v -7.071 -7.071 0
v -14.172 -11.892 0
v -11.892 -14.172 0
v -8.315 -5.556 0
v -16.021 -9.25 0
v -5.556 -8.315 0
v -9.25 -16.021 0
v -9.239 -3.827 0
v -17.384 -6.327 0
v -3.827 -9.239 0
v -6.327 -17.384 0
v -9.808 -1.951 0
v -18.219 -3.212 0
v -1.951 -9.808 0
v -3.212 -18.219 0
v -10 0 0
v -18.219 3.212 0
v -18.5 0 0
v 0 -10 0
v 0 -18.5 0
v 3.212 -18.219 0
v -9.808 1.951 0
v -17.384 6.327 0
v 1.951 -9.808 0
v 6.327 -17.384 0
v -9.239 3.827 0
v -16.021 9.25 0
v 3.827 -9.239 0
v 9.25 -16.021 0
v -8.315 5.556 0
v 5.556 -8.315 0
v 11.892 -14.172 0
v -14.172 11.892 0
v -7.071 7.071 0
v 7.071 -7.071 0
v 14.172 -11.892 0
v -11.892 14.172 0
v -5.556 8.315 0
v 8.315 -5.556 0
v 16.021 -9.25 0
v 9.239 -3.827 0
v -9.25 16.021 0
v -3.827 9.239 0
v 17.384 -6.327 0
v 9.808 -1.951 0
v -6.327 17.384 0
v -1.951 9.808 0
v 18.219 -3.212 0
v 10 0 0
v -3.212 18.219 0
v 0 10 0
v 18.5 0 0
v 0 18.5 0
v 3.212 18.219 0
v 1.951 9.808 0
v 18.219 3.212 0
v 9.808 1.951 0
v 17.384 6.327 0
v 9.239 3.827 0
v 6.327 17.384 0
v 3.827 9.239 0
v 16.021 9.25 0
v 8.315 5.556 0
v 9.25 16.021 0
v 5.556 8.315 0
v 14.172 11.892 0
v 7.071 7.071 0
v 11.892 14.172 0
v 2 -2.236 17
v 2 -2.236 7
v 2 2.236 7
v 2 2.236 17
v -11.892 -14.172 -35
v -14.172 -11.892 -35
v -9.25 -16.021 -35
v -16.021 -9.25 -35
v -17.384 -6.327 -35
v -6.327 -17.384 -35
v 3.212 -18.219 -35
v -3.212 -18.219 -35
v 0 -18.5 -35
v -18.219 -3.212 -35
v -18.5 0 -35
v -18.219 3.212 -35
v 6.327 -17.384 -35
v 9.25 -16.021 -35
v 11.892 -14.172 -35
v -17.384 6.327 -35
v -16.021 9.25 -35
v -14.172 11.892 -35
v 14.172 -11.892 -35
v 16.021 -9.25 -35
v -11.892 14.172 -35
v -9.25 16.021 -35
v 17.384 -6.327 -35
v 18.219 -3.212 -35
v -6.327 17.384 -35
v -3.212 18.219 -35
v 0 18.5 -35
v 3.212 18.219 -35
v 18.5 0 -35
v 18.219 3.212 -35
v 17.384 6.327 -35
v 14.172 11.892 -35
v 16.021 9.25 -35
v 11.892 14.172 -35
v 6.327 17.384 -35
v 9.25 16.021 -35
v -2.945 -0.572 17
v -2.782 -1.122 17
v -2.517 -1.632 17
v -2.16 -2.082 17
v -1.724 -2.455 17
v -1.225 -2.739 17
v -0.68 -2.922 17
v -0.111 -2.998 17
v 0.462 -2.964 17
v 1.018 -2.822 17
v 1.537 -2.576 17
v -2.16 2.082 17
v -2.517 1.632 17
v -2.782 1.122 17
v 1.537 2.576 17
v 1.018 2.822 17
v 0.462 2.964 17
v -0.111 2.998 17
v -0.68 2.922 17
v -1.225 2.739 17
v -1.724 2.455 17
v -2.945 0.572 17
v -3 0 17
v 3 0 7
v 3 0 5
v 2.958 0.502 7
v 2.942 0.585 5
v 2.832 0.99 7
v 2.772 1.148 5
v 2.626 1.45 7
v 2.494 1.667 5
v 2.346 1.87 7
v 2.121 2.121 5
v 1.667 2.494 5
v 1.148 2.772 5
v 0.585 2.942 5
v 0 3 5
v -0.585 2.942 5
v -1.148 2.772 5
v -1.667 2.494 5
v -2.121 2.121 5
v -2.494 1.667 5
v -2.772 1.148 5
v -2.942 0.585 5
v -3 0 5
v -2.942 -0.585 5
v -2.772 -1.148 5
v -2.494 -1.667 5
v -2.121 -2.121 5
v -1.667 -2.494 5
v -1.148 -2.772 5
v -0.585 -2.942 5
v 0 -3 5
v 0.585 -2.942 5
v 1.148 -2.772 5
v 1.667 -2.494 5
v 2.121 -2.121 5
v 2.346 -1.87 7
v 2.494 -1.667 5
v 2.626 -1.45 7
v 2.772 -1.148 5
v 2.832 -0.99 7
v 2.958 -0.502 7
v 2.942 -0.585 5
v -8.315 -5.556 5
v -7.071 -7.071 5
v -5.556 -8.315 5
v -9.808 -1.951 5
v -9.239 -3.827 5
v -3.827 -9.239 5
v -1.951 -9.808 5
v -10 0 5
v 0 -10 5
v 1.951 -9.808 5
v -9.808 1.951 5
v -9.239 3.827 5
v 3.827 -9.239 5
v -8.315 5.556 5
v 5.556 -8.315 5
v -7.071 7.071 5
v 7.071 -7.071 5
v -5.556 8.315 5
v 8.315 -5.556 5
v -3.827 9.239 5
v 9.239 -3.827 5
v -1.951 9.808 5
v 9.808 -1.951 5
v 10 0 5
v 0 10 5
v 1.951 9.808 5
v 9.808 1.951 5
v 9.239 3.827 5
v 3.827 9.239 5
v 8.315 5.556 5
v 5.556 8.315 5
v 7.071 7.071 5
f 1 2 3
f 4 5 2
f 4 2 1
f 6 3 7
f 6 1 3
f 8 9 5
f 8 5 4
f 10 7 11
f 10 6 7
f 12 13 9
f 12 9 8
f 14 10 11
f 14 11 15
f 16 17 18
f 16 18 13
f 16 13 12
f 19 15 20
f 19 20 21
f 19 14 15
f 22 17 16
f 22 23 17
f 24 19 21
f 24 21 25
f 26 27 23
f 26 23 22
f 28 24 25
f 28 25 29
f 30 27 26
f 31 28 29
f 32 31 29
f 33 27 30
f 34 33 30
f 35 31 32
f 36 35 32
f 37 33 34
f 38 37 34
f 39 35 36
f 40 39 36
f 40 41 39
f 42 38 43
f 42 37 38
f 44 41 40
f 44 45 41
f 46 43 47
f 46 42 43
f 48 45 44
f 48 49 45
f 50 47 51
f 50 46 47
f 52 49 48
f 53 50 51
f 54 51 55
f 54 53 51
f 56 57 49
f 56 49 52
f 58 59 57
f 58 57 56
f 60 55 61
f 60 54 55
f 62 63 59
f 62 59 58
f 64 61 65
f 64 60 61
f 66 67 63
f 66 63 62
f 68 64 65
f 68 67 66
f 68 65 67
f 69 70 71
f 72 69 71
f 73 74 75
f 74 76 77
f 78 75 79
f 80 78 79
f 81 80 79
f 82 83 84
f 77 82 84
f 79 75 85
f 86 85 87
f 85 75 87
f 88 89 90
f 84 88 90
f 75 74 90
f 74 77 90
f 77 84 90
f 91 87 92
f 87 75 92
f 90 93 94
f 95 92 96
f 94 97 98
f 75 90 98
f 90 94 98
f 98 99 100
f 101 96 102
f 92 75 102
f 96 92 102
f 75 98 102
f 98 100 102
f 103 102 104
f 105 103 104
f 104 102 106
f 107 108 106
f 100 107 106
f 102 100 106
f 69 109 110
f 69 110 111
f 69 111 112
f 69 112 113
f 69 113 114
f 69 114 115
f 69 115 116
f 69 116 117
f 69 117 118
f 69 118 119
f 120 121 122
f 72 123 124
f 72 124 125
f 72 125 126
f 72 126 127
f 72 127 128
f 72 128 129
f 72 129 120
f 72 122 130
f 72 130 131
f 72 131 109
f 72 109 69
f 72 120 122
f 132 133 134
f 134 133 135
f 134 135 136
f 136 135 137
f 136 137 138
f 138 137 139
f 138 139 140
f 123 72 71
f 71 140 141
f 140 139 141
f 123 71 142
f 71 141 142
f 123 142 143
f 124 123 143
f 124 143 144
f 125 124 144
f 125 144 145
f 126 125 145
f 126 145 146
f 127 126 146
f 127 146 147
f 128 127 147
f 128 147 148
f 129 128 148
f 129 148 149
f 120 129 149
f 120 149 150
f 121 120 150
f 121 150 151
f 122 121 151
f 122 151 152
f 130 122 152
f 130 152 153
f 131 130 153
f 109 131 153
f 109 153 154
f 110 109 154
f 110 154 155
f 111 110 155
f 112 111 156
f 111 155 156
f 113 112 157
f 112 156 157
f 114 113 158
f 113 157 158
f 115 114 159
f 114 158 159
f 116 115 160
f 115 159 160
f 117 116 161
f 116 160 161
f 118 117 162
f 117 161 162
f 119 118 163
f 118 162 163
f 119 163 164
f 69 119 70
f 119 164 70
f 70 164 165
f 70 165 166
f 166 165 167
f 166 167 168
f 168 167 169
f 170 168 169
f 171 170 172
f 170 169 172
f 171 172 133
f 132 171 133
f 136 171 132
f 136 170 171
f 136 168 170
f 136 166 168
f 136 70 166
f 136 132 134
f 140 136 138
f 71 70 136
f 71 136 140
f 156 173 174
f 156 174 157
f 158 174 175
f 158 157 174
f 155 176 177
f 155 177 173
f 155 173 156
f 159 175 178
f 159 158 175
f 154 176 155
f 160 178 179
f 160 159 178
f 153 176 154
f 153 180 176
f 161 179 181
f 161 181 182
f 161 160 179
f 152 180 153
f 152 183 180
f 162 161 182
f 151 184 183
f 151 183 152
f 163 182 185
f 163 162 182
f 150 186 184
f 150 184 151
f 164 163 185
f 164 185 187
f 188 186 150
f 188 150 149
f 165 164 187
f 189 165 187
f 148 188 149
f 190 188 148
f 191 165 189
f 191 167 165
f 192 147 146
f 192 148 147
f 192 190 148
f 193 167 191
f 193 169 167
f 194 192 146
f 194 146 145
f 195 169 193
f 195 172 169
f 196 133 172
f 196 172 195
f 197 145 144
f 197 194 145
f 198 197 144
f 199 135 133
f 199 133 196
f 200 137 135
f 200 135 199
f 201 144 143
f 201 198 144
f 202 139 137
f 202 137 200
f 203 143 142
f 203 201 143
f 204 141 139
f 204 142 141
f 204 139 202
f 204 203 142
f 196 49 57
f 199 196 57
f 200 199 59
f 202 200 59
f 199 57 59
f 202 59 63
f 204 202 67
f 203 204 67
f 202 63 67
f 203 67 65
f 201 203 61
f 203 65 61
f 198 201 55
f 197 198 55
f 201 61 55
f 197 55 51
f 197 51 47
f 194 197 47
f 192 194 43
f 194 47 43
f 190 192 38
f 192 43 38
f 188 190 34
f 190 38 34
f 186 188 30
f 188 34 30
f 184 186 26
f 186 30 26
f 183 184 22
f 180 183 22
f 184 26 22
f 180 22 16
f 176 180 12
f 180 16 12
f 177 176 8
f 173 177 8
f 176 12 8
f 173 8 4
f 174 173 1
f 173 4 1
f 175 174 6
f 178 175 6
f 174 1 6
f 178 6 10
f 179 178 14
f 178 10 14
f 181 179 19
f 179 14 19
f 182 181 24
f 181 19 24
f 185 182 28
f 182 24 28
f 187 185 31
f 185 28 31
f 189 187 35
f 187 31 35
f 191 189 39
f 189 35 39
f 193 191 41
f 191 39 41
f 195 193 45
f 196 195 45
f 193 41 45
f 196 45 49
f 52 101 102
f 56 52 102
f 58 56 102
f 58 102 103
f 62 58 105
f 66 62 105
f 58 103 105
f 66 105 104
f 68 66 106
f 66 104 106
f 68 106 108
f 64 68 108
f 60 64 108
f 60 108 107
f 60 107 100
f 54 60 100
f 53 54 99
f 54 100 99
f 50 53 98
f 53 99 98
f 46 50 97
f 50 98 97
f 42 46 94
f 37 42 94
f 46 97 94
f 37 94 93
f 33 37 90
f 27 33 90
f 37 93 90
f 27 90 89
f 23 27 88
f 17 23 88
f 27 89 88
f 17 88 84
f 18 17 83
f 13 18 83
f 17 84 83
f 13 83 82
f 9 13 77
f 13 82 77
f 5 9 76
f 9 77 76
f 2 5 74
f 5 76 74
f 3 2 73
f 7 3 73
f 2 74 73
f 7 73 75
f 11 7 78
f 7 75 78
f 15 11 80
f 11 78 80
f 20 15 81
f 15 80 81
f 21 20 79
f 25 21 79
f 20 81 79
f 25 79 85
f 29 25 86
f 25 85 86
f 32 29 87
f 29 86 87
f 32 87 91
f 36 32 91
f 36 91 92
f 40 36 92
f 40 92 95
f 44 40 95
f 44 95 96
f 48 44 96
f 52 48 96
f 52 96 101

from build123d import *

# Parameters (mm, degrees)
BOX_W             = 10
BOX_H             = 10
BOX_DEPTH         = 10
CYLINDER001_R     = 10
CYLINDER001_DEPTH = 5
CYLINDER002_R     = 3
CYLINDER002_DEPTH = 12
CYLINDER_R        = 18.5
CYLINDER_DEPTH    = 35


with BuildPart() as cube:
    # Box → Box (new body)
    with BuildSketch(Plane(origin=(2, -5, 7), x_dir=(1, 0, 0), z_dir=(0, 0, 1))):
        with Locations((5, 5)):
            Rectangle(BOX_W, BOX_H)
    extrude(amount=BOX_DEPTH)


with BuildPart() as cylinder001:
    # Cylinder001 → Cylinder001 (new body)
    with BuildSketch(Plane.XY):
        Circle(CYLINDER001_R)
    extrude(amount=CYLINDER001_DEPTH)


with BuildPart() as cylinder002:
    # Cylinder002 → Cylinder002 (new body)
    with BuildSketch(Plane.XY.offset(5)):
        Circle(CYLINDER002_R)
    extrude(amount=CYLINDER002_DEPTH)


with BuildPart() as cut:
    # Cylinder → Cylinder (new body)
    with BuildSketch(Plane.XY.offset(-35)):
        Circle(CYLINDER_R)
    extrude(amount=CYLINDER_DEPTH)

    # Fusion: union Cylinder001, Cylinder002
    add(cylinder001.part)
    add(cylinder002.part)

    # Cut: cut Cube
    add(cube.part, mode=Mode.SUBTRACT)


solid = cut.part
